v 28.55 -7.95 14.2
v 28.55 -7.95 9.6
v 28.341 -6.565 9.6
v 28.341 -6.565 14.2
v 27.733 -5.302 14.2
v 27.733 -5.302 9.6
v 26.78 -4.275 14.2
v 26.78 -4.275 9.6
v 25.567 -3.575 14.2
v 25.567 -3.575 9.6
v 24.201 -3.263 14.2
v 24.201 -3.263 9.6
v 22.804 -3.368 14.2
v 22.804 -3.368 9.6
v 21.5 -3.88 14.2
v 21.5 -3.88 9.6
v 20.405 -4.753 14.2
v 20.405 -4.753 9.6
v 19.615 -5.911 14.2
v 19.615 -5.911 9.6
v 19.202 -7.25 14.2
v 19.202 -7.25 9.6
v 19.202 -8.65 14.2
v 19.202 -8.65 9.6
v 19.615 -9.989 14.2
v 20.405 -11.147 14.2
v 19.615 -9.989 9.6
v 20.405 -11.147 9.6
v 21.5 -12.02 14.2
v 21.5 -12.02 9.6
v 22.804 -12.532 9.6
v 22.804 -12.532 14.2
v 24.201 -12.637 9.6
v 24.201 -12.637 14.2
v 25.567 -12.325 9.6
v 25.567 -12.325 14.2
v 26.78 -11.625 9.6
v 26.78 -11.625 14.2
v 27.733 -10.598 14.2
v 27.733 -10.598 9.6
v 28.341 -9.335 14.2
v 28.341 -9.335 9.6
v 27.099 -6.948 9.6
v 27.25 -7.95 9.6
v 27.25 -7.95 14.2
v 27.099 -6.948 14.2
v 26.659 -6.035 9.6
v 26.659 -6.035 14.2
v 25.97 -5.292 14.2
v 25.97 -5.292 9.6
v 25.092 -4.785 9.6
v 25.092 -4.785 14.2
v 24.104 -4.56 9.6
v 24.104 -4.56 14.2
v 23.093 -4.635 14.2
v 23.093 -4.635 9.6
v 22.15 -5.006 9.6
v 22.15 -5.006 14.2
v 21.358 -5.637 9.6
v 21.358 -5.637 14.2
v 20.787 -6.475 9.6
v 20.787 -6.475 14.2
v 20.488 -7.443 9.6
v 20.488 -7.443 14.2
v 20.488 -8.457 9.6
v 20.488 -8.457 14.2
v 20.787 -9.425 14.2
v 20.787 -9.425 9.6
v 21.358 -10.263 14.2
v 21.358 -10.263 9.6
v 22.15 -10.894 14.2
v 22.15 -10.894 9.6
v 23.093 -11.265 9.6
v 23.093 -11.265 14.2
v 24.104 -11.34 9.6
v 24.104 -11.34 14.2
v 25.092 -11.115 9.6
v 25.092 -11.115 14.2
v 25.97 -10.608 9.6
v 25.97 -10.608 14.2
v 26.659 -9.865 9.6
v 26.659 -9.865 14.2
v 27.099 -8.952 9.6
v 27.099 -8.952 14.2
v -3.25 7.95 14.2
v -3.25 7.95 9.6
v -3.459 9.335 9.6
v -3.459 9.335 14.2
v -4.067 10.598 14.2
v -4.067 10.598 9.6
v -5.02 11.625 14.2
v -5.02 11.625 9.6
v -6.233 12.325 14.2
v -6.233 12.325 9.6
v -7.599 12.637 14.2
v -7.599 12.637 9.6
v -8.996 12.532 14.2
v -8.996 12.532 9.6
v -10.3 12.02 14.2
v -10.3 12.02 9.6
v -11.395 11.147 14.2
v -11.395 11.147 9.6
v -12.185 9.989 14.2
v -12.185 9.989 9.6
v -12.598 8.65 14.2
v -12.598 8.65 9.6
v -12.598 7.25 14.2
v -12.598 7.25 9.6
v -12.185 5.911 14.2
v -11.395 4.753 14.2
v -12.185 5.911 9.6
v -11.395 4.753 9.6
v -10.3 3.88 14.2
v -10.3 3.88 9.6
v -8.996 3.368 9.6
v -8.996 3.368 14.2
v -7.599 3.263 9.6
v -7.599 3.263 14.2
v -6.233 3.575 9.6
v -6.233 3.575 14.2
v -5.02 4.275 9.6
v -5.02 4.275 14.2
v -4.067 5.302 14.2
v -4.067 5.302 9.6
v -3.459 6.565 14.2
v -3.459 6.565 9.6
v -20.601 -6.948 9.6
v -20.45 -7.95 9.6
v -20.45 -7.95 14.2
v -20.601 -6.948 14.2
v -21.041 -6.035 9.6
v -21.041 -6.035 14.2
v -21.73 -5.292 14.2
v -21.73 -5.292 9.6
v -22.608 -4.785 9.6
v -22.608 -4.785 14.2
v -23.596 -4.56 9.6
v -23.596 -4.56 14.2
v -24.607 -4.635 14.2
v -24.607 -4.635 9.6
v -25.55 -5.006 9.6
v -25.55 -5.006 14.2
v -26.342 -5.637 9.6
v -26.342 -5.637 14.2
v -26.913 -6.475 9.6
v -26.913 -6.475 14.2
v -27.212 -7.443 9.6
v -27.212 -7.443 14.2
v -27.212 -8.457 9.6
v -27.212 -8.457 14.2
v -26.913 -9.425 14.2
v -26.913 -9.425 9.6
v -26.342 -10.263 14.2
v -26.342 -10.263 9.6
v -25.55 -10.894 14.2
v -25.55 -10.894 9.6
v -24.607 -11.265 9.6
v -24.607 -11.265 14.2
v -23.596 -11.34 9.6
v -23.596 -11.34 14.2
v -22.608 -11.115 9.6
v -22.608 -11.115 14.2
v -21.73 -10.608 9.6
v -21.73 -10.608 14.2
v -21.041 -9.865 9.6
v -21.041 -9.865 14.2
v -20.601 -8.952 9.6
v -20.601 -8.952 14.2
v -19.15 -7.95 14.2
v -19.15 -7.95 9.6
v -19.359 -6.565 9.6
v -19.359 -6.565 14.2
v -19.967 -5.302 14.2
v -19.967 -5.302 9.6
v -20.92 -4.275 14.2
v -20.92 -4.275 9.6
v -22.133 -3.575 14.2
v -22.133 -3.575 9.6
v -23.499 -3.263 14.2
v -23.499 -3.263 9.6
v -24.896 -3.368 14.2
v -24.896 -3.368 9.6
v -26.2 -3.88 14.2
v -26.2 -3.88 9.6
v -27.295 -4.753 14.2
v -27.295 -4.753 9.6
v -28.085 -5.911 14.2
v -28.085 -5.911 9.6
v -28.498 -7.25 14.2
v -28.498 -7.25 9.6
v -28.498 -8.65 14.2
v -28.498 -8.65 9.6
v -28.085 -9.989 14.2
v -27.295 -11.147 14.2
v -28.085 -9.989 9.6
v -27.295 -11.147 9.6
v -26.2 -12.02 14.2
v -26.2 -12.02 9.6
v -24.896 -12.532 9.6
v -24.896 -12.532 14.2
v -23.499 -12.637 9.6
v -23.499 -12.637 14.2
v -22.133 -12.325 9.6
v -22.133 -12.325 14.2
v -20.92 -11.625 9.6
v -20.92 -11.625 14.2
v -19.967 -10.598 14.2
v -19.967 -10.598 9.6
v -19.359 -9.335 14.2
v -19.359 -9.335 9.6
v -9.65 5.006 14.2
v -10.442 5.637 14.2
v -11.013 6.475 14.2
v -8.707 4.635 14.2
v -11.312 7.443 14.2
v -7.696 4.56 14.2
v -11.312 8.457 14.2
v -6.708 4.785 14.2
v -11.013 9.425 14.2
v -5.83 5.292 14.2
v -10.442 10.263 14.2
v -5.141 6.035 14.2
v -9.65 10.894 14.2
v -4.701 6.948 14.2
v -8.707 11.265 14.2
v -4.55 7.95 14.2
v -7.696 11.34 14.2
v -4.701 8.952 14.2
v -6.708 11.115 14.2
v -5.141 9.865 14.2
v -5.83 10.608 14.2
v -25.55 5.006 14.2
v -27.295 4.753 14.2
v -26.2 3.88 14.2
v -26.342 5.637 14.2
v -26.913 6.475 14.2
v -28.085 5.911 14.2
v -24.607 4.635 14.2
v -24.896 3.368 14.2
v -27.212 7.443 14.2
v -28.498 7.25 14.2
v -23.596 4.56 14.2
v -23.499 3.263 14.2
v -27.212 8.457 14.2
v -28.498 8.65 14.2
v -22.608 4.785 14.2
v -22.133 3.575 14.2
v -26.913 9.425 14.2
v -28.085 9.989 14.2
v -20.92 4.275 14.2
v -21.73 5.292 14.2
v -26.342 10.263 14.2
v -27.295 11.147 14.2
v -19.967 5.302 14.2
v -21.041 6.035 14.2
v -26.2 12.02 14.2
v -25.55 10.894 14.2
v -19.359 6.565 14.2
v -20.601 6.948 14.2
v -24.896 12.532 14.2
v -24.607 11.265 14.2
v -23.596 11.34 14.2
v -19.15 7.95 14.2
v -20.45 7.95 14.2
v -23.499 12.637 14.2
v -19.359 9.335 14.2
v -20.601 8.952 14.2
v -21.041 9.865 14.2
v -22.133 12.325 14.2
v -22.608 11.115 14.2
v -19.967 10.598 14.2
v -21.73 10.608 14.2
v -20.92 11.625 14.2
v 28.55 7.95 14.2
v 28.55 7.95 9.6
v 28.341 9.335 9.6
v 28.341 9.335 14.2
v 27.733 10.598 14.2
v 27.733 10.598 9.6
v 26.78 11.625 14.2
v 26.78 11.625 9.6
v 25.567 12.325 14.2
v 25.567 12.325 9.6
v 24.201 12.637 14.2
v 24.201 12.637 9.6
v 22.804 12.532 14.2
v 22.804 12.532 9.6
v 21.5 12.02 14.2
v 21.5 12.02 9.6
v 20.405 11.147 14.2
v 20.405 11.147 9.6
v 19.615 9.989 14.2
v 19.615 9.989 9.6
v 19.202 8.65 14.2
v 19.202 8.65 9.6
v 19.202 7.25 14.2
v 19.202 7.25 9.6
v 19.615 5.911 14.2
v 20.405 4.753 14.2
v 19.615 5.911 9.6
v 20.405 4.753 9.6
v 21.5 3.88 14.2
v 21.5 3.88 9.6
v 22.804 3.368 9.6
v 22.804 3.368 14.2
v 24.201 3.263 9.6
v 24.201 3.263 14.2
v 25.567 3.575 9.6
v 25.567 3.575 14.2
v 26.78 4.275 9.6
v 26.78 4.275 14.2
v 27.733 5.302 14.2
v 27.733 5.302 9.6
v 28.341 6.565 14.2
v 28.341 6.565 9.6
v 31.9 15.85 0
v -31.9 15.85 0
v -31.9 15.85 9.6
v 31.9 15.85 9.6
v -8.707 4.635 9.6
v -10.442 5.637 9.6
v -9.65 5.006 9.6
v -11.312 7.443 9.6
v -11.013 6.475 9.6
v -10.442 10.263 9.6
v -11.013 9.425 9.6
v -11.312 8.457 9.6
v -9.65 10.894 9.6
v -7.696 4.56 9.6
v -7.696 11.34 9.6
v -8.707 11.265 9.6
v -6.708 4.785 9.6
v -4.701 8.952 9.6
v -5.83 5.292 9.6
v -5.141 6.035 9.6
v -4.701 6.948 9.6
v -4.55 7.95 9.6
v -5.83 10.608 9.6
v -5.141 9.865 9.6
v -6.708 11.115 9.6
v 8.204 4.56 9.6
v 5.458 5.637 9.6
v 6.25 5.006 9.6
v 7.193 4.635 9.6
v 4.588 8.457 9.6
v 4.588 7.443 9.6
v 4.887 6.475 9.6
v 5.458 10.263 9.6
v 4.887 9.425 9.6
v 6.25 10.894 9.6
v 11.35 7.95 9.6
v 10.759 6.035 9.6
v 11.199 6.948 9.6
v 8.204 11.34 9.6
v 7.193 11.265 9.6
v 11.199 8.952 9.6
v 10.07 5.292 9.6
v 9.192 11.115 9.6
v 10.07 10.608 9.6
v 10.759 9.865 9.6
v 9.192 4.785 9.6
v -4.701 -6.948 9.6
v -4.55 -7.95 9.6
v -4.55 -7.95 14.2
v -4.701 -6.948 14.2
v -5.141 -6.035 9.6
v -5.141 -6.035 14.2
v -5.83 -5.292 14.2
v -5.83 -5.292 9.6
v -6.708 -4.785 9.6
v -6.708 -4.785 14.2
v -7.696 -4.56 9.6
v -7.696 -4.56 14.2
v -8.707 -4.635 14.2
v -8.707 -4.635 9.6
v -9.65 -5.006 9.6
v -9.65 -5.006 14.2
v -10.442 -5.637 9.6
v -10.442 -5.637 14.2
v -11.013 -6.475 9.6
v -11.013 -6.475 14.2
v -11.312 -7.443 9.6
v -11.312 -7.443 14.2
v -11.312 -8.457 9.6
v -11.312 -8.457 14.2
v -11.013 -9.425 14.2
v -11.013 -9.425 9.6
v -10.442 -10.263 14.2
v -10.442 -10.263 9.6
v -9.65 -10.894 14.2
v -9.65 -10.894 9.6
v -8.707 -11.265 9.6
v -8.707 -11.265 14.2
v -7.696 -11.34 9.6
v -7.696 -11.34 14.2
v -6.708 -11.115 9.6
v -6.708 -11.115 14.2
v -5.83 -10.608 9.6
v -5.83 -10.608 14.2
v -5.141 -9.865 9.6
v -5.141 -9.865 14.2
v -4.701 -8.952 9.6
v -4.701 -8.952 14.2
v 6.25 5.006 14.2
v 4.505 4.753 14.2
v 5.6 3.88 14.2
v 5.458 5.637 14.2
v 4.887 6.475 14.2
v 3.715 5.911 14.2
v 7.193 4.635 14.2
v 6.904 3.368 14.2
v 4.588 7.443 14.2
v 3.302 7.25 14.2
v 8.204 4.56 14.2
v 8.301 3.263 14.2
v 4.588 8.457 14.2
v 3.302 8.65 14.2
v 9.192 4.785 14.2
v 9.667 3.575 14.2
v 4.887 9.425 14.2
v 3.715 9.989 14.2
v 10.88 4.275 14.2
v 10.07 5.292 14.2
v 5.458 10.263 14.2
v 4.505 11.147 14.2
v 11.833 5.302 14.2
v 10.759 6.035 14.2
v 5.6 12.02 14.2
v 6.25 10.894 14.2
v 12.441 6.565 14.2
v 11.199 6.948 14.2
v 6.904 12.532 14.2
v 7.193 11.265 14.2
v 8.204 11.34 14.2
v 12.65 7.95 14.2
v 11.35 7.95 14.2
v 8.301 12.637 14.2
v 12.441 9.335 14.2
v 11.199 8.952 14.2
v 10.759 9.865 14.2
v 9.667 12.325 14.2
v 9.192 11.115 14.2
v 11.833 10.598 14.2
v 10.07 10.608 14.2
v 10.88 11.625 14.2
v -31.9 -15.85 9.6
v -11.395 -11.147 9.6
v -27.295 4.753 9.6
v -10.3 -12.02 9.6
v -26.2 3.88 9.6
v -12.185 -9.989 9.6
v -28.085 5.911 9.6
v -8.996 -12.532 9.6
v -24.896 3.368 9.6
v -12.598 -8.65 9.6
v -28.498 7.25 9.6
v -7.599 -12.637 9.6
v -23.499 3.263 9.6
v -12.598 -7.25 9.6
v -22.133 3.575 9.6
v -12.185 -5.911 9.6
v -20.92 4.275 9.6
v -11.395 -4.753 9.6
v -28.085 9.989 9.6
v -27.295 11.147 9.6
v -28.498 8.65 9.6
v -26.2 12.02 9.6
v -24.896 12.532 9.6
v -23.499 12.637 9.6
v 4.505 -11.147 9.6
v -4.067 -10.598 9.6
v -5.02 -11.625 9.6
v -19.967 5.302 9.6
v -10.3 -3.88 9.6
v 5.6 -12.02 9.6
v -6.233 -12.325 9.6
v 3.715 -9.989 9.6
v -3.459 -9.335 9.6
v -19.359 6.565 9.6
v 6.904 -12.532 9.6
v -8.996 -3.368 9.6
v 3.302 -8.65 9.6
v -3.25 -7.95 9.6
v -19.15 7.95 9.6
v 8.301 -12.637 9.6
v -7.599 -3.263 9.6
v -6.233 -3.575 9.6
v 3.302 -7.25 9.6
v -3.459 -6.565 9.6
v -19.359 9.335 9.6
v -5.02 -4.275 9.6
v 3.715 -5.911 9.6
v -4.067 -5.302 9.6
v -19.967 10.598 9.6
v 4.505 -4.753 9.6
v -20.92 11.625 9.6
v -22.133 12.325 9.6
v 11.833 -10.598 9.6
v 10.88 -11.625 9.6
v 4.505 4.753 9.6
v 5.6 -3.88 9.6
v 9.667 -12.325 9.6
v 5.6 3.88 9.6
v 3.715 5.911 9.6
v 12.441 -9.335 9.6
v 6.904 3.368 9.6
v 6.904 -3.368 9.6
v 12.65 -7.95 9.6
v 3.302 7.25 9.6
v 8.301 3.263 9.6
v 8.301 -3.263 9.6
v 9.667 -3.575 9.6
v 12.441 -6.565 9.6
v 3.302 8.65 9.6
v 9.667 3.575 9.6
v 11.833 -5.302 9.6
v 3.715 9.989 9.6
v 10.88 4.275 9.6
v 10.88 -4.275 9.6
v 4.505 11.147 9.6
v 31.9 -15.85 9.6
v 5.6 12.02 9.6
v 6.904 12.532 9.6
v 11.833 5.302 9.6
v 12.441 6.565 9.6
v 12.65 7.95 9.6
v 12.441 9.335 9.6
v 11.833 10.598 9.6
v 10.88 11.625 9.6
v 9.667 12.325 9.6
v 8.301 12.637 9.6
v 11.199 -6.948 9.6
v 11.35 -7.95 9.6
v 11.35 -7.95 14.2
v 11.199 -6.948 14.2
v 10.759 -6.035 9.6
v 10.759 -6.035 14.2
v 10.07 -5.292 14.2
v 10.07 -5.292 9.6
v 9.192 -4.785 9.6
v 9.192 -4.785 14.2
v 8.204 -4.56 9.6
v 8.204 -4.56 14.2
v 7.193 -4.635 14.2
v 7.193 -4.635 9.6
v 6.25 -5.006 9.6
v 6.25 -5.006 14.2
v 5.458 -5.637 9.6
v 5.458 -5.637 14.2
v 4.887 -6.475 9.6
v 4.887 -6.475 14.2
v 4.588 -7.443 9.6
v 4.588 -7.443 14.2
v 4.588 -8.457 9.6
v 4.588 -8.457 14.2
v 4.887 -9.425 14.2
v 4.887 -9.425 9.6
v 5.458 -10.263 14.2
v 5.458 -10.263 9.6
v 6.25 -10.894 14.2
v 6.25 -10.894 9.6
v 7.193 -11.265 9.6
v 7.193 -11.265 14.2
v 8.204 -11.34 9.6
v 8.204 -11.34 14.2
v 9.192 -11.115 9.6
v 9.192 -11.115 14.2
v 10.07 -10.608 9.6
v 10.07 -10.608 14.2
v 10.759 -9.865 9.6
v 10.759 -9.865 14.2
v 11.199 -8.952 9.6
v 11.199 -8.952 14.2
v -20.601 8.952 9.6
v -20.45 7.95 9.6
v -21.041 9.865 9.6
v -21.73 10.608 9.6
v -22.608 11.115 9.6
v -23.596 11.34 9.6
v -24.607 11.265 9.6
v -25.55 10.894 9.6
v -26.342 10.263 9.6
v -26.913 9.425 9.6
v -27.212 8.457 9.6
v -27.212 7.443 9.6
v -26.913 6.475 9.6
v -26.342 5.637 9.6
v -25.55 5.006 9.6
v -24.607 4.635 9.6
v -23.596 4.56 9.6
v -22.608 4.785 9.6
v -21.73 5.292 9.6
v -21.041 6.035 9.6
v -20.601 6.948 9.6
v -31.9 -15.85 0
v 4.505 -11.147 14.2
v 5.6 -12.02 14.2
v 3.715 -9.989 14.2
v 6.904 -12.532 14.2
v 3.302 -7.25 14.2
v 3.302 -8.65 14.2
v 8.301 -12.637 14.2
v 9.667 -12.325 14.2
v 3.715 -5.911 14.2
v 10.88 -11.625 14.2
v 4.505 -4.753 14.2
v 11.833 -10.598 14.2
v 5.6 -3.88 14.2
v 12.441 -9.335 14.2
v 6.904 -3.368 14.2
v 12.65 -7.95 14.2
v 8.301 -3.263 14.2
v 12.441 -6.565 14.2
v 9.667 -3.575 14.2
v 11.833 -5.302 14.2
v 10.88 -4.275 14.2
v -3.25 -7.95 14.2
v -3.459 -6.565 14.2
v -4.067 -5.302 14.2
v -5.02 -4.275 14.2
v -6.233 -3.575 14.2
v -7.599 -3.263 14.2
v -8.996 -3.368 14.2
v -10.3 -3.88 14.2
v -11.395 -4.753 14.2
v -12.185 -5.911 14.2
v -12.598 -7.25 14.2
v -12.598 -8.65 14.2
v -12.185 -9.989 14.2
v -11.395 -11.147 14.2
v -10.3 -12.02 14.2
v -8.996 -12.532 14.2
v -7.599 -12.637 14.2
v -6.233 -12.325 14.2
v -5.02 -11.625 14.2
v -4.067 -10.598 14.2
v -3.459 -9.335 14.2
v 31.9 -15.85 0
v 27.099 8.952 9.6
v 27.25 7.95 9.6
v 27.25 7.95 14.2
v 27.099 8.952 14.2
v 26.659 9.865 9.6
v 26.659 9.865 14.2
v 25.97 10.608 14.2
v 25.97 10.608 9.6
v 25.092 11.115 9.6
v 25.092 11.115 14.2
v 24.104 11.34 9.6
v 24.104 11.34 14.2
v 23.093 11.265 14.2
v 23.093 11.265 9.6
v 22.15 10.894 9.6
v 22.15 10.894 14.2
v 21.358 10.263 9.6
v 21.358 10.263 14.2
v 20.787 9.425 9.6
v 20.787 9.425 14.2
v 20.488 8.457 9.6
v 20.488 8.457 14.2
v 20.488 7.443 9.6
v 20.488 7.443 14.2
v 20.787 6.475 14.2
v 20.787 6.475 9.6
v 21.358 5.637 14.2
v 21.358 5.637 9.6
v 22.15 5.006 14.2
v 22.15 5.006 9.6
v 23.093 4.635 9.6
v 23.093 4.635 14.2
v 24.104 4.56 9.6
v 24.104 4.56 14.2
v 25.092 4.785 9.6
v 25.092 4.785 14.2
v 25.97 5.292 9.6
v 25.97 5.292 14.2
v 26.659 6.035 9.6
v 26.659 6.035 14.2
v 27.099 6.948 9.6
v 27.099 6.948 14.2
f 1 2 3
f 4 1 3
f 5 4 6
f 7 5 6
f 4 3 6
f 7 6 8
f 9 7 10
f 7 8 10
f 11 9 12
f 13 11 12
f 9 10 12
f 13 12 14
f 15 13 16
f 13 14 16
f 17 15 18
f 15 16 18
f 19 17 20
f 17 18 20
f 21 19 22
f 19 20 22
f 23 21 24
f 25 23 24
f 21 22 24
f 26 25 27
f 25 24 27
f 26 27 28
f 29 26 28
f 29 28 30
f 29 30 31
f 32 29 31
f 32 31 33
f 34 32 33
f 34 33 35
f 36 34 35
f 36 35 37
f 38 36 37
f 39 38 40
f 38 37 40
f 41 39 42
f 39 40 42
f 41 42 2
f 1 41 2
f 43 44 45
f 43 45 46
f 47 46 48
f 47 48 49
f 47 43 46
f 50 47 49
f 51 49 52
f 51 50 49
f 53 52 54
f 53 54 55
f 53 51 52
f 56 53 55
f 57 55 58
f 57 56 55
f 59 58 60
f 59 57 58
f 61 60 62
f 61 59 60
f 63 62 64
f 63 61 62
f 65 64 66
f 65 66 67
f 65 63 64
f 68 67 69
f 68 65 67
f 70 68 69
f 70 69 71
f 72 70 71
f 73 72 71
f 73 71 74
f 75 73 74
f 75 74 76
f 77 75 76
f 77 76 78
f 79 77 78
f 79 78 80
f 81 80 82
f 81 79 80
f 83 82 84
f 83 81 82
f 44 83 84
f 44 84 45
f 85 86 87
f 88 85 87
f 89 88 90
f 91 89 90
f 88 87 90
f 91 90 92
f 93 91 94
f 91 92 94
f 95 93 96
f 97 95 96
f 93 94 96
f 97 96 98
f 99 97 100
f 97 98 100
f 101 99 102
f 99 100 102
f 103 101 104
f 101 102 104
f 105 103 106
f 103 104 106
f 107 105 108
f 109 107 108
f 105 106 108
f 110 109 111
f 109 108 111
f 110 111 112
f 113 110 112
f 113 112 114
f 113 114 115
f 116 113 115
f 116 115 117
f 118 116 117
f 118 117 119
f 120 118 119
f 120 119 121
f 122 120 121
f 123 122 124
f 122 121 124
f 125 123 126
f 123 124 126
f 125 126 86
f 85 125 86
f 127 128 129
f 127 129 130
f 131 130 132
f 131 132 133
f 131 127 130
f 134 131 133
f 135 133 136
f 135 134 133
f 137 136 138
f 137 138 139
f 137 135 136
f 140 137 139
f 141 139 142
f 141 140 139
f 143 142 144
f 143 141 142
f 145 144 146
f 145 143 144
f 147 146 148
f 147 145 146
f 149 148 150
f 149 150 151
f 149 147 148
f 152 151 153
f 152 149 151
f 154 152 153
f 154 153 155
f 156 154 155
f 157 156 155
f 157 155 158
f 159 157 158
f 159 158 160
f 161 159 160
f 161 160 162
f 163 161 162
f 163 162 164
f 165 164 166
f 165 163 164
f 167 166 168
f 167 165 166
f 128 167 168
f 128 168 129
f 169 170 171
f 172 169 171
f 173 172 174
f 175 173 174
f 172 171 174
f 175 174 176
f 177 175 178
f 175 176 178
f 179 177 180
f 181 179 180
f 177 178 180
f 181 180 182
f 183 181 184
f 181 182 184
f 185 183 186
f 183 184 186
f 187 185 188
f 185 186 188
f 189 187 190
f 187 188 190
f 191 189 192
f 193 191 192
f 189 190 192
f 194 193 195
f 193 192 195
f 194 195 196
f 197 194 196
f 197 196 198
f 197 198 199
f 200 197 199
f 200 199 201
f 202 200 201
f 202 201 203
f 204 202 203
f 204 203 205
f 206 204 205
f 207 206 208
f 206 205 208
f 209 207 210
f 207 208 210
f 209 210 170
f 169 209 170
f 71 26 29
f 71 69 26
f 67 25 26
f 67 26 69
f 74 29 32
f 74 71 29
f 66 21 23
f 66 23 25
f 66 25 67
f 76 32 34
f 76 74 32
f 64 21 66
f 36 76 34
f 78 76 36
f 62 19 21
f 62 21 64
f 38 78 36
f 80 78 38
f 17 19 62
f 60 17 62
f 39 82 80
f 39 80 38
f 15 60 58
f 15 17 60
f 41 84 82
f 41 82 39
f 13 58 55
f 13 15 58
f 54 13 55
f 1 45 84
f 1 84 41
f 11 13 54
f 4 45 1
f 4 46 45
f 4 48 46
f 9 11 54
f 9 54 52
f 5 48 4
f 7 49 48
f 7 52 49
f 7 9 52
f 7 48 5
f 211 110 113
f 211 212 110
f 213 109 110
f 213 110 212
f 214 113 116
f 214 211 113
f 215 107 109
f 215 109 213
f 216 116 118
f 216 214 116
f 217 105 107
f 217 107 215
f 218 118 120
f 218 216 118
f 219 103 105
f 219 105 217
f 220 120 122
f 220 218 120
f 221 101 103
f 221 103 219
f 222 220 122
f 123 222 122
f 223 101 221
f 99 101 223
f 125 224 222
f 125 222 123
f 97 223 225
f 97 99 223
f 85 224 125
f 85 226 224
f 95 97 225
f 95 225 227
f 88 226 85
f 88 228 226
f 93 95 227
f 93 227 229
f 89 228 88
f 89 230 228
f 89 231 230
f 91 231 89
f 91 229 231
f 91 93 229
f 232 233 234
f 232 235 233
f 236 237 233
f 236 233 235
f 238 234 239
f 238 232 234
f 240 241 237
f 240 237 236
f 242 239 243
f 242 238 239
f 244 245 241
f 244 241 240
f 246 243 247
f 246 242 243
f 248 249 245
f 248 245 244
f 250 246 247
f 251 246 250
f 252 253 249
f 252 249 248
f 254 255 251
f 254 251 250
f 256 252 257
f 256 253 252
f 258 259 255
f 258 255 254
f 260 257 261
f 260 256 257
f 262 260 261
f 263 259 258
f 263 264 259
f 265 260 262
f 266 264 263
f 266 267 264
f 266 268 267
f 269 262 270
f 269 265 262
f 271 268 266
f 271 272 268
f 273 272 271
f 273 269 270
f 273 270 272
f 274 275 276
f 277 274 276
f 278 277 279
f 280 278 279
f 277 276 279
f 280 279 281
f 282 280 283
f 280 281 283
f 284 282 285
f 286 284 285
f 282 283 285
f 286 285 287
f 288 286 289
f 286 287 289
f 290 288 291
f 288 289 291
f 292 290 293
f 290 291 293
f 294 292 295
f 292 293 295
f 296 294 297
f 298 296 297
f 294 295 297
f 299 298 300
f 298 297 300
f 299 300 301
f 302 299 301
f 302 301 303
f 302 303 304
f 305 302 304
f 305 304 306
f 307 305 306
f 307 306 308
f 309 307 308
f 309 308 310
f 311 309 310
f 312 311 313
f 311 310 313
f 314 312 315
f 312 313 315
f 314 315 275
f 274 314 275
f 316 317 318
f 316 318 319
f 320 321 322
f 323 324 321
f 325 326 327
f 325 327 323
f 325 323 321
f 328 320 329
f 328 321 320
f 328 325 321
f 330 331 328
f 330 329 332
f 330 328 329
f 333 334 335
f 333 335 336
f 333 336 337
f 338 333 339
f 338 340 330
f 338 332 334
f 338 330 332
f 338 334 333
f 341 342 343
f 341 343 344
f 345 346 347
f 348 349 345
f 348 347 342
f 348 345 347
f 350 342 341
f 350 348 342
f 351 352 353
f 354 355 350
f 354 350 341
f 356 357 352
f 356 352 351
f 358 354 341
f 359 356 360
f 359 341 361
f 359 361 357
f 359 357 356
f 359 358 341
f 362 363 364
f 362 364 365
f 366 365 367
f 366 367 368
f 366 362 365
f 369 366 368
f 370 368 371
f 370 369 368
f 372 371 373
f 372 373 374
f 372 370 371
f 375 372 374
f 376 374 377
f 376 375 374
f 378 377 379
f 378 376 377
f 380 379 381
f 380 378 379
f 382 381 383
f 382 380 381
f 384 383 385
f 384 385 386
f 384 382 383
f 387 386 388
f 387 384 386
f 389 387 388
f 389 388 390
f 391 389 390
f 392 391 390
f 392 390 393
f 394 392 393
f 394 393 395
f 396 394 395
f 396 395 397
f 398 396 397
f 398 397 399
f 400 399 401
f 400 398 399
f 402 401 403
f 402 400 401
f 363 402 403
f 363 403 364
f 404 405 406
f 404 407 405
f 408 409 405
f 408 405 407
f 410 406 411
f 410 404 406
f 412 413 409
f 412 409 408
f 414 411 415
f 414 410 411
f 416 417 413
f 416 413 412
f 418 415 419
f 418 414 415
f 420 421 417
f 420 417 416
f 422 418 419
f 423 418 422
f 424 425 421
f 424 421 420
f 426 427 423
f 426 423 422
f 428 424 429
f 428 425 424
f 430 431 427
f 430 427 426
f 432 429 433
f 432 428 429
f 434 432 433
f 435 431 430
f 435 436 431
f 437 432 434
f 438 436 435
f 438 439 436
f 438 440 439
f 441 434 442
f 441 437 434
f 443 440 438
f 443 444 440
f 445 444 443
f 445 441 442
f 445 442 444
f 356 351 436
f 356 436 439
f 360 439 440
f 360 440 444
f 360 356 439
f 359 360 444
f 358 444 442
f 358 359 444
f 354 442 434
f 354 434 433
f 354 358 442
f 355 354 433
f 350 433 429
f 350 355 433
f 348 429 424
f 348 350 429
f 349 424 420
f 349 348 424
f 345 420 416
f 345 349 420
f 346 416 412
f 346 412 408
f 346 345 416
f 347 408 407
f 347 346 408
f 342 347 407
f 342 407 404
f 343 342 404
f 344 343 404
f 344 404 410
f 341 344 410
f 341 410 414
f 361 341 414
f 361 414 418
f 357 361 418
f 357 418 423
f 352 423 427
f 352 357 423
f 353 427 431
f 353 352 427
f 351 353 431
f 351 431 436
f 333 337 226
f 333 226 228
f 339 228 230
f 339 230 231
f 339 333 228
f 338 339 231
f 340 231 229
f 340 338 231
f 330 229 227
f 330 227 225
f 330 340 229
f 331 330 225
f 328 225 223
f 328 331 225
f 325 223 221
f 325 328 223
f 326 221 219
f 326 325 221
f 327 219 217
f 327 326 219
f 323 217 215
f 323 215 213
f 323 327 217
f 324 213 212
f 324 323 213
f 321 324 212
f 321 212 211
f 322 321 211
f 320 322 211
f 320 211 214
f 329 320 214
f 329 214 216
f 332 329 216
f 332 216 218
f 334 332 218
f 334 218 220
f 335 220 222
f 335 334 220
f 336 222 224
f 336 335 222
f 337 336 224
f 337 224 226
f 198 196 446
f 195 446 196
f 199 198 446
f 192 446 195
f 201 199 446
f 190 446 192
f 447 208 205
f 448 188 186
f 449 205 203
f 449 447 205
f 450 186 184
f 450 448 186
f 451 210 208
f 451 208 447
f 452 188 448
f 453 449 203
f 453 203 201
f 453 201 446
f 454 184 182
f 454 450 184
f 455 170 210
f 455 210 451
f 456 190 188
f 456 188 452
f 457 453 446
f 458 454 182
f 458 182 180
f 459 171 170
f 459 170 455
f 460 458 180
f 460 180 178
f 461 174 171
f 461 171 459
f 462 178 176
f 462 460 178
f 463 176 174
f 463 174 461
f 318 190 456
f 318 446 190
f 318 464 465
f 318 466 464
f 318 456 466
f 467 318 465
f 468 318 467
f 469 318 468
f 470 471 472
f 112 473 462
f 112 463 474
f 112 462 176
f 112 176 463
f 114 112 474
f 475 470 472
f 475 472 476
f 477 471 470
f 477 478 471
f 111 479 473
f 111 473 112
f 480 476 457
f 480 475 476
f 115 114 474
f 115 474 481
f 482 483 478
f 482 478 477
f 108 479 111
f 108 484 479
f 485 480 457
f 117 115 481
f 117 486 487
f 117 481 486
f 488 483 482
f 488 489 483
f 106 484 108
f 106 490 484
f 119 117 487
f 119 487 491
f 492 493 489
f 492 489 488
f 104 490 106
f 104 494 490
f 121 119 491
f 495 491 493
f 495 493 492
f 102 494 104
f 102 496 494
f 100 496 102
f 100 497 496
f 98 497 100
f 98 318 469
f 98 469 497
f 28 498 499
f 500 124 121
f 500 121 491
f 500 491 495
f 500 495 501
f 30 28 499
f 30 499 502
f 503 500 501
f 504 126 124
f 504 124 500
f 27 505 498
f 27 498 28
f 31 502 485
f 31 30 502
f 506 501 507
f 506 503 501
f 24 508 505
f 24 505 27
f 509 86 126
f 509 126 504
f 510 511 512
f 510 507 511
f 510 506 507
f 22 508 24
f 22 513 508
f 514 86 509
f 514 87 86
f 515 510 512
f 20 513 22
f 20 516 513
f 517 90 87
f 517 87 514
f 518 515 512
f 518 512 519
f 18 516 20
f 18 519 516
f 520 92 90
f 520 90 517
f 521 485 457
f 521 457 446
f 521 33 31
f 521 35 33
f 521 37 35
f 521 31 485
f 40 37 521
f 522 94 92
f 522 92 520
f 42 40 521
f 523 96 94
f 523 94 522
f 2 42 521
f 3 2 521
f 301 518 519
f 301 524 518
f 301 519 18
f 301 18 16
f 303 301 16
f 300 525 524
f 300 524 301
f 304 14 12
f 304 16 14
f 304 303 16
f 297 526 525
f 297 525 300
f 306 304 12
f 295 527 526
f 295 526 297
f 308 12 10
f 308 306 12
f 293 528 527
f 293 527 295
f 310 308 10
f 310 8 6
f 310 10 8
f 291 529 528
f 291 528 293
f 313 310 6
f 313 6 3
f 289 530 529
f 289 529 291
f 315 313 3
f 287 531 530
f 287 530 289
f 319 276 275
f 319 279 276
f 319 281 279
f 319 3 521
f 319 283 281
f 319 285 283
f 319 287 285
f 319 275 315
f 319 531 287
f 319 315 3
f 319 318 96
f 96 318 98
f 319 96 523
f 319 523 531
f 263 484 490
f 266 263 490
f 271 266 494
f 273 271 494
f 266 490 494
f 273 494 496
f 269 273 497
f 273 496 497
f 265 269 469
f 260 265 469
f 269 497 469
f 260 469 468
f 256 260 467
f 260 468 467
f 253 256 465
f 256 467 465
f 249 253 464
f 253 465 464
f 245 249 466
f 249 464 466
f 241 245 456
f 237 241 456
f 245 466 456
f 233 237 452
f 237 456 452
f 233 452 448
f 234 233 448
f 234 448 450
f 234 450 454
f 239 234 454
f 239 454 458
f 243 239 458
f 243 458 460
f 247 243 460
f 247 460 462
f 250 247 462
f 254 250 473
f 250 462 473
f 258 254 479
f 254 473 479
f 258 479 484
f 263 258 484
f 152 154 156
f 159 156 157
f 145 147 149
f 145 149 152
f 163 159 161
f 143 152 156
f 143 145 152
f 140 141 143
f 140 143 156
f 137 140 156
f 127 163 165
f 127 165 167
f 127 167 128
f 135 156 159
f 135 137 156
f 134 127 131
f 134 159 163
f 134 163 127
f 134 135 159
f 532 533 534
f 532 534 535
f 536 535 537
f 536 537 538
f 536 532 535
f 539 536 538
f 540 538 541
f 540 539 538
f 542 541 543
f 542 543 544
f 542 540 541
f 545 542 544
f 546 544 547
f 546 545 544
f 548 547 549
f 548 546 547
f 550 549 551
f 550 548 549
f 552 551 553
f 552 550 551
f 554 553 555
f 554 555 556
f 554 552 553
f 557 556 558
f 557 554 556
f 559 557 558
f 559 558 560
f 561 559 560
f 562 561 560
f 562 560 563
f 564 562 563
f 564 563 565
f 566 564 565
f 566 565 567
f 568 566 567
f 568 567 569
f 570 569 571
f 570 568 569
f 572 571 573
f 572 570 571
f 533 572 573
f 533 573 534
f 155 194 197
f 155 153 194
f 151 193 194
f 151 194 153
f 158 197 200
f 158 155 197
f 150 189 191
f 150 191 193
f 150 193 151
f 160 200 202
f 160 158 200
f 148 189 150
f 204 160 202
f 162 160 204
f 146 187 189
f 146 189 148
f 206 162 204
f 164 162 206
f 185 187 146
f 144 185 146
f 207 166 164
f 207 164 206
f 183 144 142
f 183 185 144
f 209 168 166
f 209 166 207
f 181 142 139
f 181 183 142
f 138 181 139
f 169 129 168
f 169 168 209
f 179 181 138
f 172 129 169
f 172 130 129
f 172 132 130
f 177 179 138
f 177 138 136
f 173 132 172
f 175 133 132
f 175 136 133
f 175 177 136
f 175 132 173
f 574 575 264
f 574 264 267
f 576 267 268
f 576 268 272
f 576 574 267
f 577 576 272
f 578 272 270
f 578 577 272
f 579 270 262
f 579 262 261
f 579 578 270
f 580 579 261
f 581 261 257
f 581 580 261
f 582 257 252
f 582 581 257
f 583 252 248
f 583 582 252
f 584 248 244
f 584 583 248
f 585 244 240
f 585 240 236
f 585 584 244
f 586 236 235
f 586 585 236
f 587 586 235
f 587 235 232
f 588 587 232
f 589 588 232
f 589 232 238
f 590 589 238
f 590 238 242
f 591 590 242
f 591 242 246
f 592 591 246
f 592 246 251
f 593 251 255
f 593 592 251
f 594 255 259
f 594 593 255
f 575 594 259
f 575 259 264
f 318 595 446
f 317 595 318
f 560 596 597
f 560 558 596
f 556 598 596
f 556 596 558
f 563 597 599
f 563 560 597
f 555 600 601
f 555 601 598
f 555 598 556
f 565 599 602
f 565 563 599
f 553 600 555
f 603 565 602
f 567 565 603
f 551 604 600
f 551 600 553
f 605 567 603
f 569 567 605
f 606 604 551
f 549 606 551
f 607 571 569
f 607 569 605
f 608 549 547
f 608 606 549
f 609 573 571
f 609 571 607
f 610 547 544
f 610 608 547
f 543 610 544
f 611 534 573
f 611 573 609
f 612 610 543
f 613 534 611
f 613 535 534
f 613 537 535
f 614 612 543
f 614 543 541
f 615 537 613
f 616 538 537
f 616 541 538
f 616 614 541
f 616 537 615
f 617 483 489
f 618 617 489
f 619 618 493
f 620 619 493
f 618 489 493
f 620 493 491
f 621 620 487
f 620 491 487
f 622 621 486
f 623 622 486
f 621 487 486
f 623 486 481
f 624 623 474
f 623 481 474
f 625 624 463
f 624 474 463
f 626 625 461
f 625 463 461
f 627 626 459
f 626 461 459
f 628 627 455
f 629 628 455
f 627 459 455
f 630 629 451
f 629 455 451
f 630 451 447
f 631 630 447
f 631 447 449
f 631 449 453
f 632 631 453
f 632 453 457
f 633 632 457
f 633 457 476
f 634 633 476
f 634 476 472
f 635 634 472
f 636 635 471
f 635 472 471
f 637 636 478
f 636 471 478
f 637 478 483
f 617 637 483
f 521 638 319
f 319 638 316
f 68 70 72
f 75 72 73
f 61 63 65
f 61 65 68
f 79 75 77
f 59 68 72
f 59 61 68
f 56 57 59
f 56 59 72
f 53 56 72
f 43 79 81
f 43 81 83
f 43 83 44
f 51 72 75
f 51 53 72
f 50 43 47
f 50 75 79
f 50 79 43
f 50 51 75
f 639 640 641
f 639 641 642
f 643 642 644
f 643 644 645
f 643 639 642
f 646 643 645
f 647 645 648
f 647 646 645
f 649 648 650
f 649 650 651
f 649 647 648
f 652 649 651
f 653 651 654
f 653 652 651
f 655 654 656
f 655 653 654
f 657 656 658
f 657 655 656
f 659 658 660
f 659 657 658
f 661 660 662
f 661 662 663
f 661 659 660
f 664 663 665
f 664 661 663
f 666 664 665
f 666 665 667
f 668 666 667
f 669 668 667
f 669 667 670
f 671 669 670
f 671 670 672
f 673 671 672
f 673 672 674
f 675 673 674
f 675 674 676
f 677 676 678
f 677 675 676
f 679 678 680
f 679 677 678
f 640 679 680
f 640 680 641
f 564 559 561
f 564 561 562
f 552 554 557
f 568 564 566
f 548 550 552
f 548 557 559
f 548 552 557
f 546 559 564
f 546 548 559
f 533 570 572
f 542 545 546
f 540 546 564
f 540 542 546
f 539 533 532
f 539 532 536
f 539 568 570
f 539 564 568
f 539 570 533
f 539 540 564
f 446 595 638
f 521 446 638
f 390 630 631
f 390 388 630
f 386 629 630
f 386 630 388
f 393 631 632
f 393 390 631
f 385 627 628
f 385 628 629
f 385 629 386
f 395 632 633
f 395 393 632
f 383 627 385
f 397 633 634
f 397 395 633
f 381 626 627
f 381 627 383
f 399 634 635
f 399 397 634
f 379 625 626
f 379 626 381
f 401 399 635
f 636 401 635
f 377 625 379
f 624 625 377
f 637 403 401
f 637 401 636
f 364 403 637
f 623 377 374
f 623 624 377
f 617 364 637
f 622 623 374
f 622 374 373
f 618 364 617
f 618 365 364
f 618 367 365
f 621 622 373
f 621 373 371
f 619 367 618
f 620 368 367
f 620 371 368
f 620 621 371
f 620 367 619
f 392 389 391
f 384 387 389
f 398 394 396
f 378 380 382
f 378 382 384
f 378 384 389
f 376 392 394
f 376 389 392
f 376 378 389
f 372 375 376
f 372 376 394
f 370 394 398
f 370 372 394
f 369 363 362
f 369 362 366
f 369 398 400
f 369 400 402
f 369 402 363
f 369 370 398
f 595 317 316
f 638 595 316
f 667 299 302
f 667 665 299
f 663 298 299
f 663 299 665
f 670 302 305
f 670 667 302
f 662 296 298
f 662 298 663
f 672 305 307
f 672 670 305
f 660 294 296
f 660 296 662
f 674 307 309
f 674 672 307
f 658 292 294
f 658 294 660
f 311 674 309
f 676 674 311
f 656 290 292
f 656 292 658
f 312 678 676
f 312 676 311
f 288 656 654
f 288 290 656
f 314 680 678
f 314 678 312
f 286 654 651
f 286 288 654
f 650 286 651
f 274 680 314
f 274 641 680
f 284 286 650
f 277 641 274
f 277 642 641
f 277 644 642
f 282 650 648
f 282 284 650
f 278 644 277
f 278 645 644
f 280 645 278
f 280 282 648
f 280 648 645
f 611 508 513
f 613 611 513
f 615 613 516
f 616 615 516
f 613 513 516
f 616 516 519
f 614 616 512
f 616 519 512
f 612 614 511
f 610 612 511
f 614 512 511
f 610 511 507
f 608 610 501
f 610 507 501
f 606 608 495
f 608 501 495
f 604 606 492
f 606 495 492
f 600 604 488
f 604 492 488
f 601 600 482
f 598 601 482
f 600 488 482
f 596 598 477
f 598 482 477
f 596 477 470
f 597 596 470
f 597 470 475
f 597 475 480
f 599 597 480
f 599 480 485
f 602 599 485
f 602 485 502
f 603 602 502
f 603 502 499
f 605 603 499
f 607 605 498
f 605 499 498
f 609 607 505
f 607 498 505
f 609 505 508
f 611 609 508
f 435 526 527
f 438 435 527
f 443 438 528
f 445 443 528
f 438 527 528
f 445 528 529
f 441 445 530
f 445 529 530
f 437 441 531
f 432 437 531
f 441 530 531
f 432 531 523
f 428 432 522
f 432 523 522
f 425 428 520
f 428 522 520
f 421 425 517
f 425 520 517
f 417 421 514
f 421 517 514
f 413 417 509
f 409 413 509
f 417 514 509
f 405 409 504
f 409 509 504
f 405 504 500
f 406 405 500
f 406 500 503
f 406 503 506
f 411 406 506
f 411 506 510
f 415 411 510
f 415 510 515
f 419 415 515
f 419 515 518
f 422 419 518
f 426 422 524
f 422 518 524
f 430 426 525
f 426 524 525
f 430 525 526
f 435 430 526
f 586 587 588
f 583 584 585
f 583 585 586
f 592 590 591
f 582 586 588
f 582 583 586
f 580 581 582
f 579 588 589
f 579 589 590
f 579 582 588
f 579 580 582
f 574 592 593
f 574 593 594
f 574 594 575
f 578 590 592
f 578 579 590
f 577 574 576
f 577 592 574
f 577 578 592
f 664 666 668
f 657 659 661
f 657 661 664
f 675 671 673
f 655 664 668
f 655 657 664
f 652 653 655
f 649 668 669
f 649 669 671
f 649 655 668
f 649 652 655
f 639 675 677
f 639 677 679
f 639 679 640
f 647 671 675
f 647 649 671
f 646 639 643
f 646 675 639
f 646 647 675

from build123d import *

# Parameters (mm, degrees)
F0_W     = 63.8
F0_H     = 31.7
F1_DEPTH = 9.6
F2_R     = 4.7
F2_R_2   = 3.4
F3_DEPTH = 4.6


with BuildPart() as f1:
    # F0 (on Top) → F1 (new body)
    with BuildSketch(Plane.XY):
        Rectangle(F0_W, F0_H)
    extrude(amount=F1_DEPTH)

    # F2 (on face) → F3 (join)
    with BuildSketch(Plane.XY.offset(9.6)):
        with Locations((7.95, 7.95)):
            Circle(F2_R)
        with Locations((7.95, 7.95)):
            Circle(F2_R_2, mode=Mode.SUBTRACT)
        with Locations((-7.95, 7.95)):
            Circle(F2_R)
        with Locations((-7.95, 7.95)):
            Circle(F2_R_2, mode=Mode.SUBTRACT)
        with Locations((-23.85, 7.95)):
            Circle(F2_R)
        with Locations((-23.85, 7.95)):
            Circle(F2_R_2, mode=Mode.SUBTRACT)
        with Locations((23.85, 7.95)):
            Circle(F2_R)
        with Locations((23.85, 7.95)):
            Circle(F2_R_2, mode=Mode.SUBTRACT)
        with Locations((7.95, -7.95)):
            Circle(F2_R)
        with Locations((7.95, -7.95)):
            Circle(F2_R_2, mode=Mode.SUBTRACT)
        with Locations((-23.85, -7.95)):
            Circle(F2_R)
        with Locations((-23.85, -7.95)):
            Circle(F2_R_2, mode=Mode.SUBTRACT)
        with Locations((23.85, -7.95)):
            Circle(F2_R)
        with Locations((23.85, -7.95)):
            Circle(F2_R_2, mode=Mode.SUBTRACT)
        with Locations((-7.95, -7.95)):
            Circle(F2_R)
        with Locations((-7.95, -7.95)):
            Circle(F2_R_2, mode=Mode.SUBTRACT)
    extrude(amount=F3_DEPTH)


solid = f1.part
